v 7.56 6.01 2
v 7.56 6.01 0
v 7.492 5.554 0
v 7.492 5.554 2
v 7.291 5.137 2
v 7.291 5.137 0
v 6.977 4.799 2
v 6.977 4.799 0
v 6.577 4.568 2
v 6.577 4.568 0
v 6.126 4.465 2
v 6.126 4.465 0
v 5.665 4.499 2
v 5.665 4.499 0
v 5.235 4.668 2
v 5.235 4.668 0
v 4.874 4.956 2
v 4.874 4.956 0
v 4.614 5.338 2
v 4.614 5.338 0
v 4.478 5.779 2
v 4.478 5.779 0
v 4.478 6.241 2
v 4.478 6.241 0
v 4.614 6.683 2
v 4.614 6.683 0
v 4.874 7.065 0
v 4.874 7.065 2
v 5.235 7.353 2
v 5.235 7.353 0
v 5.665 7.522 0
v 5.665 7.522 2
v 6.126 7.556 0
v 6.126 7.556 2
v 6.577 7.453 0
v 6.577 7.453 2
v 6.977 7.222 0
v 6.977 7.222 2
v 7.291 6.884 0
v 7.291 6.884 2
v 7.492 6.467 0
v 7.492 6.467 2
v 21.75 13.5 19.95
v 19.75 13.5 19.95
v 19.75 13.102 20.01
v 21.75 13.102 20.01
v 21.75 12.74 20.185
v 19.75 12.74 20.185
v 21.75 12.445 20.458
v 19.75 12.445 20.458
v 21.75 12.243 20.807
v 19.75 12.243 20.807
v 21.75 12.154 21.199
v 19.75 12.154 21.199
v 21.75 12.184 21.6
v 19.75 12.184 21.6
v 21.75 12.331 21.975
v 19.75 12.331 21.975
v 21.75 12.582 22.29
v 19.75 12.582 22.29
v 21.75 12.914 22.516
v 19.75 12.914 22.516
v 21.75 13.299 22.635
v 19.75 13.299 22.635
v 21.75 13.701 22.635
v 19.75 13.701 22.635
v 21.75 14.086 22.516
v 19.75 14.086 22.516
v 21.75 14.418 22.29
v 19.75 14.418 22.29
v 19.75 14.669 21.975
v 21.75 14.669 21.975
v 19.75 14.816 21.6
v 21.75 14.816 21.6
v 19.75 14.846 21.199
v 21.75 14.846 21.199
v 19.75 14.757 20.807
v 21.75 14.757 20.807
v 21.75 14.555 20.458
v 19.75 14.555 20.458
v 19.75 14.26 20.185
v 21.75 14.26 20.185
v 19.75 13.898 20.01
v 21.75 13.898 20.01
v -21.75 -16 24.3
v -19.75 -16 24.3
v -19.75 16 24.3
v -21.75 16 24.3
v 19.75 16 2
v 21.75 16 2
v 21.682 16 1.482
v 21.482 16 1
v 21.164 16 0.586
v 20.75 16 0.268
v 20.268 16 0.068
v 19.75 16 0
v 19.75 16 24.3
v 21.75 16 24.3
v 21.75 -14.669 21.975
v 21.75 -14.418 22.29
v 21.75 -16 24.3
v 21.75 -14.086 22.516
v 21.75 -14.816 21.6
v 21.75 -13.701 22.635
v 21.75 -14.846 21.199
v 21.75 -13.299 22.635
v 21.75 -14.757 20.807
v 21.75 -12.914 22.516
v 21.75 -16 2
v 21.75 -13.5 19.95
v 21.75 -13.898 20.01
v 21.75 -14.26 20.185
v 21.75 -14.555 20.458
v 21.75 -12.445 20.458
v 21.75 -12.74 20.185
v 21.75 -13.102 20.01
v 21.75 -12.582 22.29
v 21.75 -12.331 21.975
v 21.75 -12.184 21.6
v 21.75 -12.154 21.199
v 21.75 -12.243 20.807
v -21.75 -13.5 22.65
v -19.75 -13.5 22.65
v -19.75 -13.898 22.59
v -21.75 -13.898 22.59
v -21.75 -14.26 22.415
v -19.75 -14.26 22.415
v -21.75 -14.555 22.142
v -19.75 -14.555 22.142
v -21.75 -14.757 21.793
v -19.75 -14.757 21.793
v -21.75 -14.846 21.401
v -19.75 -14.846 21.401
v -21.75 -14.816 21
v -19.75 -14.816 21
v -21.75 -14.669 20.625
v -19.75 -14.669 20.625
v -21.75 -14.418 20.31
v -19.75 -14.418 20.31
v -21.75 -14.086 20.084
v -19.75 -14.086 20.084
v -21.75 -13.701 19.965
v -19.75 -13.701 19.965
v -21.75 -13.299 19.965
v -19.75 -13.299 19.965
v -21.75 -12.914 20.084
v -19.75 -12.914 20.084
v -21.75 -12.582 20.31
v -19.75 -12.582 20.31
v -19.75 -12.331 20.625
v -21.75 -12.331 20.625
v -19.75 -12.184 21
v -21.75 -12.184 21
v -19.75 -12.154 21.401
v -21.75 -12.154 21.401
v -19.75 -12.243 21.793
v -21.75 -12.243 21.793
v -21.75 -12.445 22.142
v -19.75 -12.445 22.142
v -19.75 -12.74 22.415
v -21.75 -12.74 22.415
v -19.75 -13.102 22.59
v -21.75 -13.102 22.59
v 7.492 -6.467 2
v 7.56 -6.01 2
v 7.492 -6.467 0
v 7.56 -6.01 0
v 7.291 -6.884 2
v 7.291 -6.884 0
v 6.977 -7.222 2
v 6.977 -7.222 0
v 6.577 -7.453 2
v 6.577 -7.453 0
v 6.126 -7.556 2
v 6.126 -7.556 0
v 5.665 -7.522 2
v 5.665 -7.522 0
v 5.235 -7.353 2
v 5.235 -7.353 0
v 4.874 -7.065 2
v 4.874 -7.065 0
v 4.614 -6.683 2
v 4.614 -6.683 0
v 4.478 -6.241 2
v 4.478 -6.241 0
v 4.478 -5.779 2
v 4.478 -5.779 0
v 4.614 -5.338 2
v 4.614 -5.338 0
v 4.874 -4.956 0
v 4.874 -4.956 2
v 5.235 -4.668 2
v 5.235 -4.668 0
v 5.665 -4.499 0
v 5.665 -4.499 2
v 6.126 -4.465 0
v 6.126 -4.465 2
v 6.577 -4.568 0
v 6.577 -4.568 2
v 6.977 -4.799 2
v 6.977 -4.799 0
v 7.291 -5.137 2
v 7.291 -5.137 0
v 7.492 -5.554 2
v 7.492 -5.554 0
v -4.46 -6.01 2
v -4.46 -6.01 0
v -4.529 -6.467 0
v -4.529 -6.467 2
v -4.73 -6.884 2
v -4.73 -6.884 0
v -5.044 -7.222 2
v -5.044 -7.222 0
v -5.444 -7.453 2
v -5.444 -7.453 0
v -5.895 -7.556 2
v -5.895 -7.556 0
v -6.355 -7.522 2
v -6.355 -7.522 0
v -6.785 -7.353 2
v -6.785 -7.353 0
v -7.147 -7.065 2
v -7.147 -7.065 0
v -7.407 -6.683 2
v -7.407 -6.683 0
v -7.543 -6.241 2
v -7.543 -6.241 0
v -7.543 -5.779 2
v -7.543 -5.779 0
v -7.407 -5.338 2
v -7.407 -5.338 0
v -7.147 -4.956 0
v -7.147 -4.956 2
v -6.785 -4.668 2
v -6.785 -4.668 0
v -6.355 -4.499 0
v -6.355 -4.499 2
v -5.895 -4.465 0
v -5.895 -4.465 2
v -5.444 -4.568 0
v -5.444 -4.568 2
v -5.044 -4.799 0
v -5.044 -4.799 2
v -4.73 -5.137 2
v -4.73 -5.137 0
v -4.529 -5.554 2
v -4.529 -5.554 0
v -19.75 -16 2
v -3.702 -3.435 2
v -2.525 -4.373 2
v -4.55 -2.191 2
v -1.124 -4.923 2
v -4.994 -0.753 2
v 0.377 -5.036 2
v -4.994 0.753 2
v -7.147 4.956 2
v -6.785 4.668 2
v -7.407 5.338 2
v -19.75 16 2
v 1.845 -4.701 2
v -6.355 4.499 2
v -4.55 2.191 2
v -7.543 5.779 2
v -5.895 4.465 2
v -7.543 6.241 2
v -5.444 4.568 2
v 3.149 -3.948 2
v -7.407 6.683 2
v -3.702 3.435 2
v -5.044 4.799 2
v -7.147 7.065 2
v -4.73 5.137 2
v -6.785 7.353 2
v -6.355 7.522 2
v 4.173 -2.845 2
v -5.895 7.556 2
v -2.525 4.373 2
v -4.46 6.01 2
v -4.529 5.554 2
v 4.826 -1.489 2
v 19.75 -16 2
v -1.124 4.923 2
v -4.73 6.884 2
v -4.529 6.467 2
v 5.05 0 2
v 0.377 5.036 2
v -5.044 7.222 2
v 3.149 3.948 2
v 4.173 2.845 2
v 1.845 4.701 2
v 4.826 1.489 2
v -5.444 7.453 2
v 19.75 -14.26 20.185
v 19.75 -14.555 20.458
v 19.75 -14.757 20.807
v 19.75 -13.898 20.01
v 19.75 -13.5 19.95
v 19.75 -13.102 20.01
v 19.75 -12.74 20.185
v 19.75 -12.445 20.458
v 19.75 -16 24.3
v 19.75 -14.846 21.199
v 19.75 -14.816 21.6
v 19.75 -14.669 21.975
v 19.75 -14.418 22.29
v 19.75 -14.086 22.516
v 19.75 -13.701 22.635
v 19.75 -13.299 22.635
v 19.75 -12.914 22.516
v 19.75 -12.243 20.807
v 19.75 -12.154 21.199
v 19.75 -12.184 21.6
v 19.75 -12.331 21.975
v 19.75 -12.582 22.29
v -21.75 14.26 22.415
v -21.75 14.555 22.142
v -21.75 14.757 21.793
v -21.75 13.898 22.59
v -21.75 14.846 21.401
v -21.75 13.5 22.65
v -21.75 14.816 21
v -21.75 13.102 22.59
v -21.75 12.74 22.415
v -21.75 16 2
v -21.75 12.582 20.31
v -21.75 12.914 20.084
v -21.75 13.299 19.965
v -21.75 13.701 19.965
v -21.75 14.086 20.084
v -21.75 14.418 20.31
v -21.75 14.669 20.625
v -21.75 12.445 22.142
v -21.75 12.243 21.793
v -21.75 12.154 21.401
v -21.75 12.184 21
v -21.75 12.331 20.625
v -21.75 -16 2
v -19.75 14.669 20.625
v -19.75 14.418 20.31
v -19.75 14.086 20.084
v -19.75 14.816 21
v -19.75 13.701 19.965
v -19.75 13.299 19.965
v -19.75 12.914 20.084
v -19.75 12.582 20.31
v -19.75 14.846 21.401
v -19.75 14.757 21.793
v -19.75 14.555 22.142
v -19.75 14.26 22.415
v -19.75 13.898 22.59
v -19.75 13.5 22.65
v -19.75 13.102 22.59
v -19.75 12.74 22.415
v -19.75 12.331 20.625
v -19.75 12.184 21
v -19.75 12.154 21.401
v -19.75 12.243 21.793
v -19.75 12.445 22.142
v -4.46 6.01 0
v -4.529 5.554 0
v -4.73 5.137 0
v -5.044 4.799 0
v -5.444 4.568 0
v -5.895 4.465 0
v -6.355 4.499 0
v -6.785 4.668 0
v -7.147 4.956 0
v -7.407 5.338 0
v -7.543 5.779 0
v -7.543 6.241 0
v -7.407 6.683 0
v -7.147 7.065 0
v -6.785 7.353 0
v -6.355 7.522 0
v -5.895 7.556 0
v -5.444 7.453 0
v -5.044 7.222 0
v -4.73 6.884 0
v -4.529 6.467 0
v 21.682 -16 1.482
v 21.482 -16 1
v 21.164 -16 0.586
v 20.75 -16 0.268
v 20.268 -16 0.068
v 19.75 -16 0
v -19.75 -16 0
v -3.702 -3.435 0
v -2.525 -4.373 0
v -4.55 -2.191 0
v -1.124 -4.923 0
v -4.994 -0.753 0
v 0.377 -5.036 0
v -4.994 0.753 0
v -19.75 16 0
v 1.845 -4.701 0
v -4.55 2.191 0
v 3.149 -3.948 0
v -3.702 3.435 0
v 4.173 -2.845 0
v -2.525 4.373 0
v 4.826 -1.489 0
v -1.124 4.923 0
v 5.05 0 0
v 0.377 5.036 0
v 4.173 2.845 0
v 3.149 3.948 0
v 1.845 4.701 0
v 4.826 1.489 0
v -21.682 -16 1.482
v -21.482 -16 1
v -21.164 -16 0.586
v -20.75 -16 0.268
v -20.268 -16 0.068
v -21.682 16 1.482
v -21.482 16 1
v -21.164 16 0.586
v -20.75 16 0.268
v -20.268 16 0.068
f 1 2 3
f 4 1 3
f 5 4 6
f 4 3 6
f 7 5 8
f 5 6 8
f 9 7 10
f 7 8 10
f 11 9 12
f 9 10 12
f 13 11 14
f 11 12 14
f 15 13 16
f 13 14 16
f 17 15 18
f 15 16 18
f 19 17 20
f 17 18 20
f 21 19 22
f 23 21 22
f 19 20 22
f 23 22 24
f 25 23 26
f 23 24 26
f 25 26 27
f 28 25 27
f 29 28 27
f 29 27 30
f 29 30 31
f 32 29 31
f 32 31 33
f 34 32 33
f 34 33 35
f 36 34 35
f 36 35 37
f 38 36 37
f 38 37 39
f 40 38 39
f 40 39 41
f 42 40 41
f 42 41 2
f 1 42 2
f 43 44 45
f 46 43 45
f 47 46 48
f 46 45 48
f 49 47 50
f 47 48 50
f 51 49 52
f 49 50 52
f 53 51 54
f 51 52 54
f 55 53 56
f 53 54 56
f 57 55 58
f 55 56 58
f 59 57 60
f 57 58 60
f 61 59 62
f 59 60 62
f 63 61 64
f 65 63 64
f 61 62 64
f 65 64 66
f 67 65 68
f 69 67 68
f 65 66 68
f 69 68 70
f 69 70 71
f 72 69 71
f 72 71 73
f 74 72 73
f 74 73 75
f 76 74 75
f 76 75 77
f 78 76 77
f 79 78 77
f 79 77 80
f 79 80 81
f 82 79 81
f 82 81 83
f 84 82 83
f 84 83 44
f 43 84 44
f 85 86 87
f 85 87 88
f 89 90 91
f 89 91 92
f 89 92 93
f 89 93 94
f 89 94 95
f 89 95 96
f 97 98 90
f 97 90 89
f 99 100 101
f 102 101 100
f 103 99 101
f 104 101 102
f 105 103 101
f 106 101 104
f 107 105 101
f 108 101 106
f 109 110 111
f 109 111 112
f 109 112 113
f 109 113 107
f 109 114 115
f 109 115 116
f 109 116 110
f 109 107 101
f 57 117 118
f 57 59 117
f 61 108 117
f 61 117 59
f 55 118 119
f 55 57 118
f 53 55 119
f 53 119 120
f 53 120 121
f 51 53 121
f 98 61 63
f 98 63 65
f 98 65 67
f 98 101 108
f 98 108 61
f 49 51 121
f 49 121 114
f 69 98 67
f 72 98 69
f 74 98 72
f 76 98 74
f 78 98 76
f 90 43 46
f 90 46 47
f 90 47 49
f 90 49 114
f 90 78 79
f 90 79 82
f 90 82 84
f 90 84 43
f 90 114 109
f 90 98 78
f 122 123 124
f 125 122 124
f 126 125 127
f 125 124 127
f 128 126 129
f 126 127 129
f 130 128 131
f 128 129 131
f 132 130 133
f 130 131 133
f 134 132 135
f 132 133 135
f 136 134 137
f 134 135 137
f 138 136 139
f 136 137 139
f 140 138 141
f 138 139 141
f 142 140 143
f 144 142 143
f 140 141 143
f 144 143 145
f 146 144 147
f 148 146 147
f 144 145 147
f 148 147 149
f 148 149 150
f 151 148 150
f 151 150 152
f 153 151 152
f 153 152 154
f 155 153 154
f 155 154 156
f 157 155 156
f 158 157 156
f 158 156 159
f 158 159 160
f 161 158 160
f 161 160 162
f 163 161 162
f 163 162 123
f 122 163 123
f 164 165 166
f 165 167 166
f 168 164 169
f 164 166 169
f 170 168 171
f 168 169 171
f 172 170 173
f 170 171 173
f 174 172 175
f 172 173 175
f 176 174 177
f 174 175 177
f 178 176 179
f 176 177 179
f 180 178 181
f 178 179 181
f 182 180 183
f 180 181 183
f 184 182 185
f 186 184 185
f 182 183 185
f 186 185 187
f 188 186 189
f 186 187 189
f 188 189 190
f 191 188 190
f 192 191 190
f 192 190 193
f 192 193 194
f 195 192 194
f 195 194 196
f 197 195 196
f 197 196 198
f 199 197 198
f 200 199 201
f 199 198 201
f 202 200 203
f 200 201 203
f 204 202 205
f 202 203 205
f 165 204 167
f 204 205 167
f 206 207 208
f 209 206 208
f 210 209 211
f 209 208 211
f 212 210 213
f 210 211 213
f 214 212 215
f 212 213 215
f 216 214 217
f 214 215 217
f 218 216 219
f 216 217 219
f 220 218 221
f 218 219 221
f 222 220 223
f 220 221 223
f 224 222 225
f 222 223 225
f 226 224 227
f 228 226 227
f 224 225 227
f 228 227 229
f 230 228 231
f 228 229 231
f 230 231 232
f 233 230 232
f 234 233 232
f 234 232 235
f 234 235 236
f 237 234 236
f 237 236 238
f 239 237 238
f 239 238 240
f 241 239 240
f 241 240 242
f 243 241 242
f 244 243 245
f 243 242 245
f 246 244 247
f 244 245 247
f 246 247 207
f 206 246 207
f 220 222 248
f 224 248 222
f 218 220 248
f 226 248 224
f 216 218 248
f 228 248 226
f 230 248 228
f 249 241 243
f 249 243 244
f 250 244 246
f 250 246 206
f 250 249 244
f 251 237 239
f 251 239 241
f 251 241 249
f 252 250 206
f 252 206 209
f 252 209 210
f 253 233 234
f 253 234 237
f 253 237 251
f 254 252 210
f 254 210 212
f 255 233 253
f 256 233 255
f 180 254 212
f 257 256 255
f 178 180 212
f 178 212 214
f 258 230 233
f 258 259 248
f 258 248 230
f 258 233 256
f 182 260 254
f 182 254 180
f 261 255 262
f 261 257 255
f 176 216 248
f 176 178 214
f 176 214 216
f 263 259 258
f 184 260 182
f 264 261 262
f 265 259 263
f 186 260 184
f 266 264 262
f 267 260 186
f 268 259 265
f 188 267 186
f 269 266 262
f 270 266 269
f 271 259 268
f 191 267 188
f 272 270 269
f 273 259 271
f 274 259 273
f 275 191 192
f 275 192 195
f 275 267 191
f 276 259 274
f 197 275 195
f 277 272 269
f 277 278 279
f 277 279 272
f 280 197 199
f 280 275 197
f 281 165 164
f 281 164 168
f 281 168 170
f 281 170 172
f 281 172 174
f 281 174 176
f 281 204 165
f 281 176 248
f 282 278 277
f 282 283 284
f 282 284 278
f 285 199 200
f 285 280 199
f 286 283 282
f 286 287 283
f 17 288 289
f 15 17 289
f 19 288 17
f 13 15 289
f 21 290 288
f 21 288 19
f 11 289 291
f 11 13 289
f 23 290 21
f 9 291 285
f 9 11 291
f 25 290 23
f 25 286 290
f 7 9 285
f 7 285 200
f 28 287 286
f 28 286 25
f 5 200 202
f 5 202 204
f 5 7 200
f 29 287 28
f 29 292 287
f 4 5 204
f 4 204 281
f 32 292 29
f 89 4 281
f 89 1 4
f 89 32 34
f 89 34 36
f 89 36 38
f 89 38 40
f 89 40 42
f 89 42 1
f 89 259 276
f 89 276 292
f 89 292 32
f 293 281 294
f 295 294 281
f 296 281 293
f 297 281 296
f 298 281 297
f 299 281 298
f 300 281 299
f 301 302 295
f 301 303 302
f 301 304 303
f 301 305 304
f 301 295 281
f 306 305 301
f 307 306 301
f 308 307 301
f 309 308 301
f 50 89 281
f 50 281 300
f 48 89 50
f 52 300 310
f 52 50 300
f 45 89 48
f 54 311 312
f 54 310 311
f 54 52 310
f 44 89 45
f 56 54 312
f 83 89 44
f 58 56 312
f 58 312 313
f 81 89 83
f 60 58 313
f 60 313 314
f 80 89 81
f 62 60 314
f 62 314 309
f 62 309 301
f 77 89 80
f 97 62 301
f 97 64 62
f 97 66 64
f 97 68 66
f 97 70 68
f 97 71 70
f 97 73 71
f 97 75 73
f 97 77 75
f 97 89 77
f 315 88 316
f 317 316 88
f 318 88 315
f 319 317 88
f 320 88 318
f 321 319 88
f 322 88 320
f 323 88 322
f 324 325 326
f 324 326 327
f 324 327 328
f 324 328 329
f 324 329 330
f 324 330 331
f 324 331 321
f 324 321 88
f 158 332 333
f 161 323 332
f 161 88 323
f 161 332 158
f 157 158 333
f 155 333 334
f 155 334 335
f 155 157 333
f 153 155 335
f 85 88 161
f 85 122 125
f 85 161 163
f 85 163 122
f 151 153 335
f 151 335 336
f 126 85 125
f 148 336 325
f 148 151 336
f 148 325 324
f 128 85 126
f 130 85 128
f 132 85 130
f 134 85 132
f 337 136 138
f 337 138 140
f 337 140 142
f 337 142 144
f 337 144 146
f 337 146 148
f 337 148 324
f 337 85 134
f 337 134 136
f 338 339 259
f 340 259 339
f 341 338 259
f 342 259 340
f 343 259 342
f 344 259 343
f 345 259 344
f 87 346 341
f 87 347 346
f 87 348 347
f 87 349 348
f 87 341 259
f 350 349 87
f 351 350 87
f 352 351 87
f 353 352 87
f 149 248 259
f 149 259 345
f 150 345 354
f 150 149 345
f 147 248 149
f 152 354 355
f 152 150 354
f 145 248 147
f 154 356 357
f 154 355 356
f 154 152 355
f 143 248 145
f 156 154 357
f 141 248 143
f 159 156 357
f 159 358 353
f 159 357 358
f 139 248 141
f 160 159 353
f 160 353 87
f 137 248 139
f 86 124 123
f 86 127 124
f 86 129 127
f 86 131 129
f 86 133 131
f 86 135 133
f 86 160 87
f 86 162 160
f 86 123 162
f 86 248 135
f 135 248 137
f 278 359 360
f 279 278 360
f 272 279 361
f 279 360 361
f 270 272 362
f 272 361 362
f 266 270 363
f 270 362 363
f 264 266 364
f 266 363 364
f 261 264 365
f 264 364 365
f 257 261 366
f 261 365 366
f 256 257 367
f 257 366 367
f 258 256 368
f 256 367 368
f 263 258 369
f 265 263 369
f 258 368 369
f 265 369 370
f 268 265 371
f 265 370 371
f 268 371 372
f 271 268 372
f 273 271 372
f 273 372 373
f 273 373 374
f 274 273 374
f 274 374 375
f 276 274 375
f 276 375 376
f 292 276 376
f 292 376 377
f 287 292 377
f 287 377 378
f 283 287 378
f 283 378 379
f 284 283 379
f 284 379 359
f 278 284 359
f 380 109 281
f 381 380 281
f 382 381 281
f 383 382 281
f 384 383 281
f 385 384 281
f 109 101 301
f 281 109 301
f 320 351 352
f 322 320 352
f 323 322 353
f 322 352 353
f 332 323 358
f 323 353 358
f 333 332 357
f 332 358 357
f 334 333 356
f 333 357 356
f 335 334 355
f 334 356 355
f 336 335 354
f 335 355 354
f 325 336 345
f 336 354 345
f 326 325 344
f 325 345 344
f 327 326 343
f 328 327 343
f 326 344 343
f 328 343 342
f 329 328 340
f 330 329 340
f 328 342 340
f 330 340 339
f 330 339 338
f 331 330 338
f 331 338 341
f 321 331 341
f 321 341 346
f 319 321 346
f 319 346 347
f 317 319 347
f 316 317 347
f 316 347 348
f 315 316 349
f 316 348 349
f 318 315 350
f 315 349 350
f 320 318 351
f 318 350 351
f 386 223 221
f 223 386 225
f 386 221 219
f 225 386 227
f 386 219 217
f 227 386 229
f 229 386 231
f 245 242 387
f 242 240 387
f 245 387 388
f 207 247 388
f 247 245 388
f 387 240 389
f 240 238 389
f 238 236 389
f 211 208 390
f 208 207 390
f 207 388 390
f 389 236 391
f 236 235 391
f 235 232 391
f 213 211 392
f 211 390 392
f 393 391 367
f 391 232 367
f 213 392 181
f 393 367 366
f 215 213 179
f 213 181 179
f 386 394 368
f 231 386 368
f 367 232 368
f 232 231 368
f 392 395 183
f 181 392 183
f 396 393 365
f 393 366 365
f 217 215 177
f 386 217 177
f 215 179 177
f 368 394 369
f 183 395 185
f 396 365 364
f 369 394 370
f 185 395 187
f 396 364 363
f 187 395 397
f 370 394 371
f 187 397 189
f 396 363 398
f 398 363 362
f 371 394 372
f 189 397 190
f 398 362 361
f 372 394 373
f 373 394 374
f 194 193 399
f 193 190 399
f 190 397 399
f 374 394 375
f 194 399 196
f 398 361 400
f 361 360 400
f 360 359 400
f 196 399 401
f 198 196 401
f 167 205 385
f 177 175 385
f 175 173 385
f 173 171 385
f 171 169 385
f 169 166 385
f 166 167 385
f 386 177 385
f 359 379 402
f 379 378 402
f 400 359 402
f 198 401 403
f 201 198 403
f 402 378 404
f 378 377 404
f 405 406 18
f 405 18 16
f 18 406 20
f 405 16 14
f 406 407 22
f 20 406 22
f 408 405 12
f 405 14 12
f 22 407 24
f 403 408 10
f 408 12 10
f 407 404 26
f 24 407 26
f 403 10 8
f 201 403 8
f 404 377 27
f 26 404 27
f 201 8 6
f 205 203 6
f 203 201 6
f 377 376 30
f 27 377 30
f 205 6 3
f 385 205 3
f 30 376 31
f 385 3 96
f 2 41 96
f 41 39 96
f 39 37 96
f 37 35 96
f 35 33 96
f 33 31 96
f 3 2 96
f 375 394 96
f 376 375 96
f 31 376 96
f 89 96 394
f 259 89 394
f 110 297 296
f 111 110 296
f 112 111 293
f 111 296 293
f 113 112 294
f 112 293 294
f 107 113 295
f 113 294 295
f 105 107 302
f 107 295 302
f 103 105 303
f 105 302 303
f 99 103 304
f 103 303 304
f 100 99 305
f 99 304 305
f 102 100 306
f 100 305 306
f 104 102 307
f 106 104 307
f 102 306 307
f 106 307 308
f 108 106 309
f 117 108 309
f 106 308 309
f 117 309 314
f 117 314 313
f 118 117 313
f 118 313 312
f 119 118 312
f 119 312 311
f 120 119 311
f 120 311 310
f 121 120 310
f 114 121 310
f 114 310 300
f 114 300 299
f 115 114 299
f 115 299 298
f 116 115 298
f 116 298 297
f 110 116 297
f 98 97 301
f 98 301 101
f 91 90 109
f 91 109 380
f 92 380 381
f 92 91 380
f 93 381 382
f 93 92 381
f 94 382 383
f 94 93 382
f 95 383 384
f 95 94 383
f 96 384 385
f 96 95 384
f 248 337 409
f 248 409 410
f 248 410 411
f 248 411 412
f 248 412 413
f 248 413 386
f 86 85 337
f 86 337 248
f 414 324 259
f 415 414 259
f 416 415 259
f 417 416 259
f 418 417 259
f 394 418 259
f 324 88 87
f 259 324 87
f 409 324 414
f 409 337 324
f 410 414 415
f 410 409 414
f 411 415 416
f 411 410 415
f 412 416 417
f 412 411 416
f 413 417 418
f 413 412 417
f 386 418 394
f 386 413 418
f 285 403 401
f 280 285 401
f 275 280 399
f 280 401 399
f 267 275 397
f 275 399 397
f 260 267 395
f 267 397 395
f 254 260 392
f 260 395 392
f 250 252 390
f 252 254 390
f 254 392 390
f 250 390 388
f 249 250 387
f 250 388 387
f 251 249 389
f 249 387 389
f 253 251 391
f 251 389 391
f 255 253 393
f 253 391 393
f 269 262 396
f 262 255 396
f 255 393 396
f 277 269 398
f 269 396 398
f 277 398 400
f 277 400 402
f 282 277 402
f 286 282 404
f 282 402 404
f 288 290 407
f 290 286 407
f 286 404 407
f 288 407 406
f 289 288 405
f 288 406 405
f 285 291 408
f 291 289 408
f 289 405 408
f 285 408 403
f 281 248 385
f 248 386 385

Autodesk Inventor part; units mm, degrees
ref_plane "YZ Plane" through (0, 0, 0) normal (1, 0, 0) x (0, 1, 0)
ref_plane "XZ Plane" through (0, 0, 0) normal (0, 1, 0) x (-1, 0, 0)
ref_plane "XY Plane" through (0, 0, 0) normal (0, 0, 1) x (1, 0, 0)
sketch "スケッチ1" plane through (0, 0, 0) normal (0, 0, 1) x (1, 0, 0)
  line L0 (-19.75, -16) -> (19.75, -16)
  line L1 (19.75, -16) -> (19.75, 16)
  line L2 (19.75, 16) -> (-19.75, 16)
  line L3 (-19.75, 16) -> (-19.75, -16)
  line L4 (-19.75, -16) -> (19.75, 16) construction
  line L5 (19.75, -16) -> (-19.75, 16) construction
  circle A0 centre (0, 0) radius 5.05
  circle A1 centre (-6.0104, 6.0104) radius 1.55
  circle A2 centre (0, 0) radius 8.5 construction
  line L6 (-6.0104, 6.0104) -> (0, 0) construction
  circle A3 centre (-6.0104, -6.0104) radius 1.55
  circle A4 centre (6.0104, -6.0104) radius 1.55
  circle A5 centre (6.0104, 6.0104) radius 1.55
  circle A6 centre (0, 0) radius 8.5
  dimension "d35" = 17
  dimension "d0" = 39.5
  dimension "d1" = 32
  dimension "d2" = 10.1
  dimension "d3" = 3.1
  dimension "d5" = 45
  dimension "d8" = 360
extrude "押し出し1" add sketch "スケッチ1" along normal blind 2 contours L3 L2 L1 L0 | A1 A6 A5 A4 A3
sketch "スケッチ2" plane through (-19.75, -16, 2) normal (-1, 0, 0) x (0, -1, 0)
  line L0 (-32, 0) -> (0, 0)
  line L1 (0, 0) -> (0, 22.3)
  line L2 (0, 22.3) -> (-32, 22.3)
  line L3 (-32, 22.3) -> (-32, 0)
edge flange "フランジ1" height 22.3 angle 90 thickness 2 bend radius 0.0001 thickness toward (-1, 0, 0) relief tear relief width 2 relief depth 1 corner gap 2 corner form 0 edges at (-19.75, 0, 2) (19.75, 0, 2) wall of the first edge with corners at (-19.75, 16, 2) (-19.75, -16, 2) (-19.75, -16, 24.3) (-19.75, 16, 24.3)
bend "曲げ1"
corner "コーナー1"
sketch "スケッチ4" plane through (21.75, -16, 24.3) normal (1, 0, 0) x (0, 0, -1)
  line L0 (0, 0) -> (0, 32) projected
  line L1 (0, 32) -> (0, 0) construction
  line L2 (0, 16) -> (24.3, 16) construction
  point P0 (3, 2.5)
  point P1 (3, 29.5)
  dimension "d25" = 3
  dimension "d26" = 13.5
hole "穴1" at (21.75, -13.5, 21.3) at (21.75, 13.5, 21.3) direction (-1, 0, 0) diameter 2.7 end up to surface
mirror "ミラー1" about plane through (0, 0, 0) normal (1, 0, 0) of "穴1"
equation "\"d32\" = Thickness"
equation "\"d12\" = BendReliefWidth"
equation "\"d13\" = BendReliefDepth"
equation "\"d14\" = MinimumRemnant"
equation "\"d15\" = BendRadius"
equation "\"d19\" = CornerReliefSize"
equation "\"d20\" = GapSize"
equation "\"d21\" = JacobiRadiusSize"
equation "\"d34\" = Thickness"
equation "\"BendRadius\" = Thickness"
equation "\"BendReliefWidth\" = Thickness"
equation "\"BendReliefDepth\" = 0.5 * Thickness"
equation "\"CornerReliefSize\" = 4 * Thickness"
equation "\"MinimumRemnant\" = 2 * Thickness"
equation "\"TransitionRadius\" = BendRadius"
equation "\"JacobiRadiusSize\" = BendRadius"
equation "\"GapSize\" = Thickness"
equation "\"Thickness\" = 2"
properties part number "servo_bracket_1170" material "アルミニウム 5052"
